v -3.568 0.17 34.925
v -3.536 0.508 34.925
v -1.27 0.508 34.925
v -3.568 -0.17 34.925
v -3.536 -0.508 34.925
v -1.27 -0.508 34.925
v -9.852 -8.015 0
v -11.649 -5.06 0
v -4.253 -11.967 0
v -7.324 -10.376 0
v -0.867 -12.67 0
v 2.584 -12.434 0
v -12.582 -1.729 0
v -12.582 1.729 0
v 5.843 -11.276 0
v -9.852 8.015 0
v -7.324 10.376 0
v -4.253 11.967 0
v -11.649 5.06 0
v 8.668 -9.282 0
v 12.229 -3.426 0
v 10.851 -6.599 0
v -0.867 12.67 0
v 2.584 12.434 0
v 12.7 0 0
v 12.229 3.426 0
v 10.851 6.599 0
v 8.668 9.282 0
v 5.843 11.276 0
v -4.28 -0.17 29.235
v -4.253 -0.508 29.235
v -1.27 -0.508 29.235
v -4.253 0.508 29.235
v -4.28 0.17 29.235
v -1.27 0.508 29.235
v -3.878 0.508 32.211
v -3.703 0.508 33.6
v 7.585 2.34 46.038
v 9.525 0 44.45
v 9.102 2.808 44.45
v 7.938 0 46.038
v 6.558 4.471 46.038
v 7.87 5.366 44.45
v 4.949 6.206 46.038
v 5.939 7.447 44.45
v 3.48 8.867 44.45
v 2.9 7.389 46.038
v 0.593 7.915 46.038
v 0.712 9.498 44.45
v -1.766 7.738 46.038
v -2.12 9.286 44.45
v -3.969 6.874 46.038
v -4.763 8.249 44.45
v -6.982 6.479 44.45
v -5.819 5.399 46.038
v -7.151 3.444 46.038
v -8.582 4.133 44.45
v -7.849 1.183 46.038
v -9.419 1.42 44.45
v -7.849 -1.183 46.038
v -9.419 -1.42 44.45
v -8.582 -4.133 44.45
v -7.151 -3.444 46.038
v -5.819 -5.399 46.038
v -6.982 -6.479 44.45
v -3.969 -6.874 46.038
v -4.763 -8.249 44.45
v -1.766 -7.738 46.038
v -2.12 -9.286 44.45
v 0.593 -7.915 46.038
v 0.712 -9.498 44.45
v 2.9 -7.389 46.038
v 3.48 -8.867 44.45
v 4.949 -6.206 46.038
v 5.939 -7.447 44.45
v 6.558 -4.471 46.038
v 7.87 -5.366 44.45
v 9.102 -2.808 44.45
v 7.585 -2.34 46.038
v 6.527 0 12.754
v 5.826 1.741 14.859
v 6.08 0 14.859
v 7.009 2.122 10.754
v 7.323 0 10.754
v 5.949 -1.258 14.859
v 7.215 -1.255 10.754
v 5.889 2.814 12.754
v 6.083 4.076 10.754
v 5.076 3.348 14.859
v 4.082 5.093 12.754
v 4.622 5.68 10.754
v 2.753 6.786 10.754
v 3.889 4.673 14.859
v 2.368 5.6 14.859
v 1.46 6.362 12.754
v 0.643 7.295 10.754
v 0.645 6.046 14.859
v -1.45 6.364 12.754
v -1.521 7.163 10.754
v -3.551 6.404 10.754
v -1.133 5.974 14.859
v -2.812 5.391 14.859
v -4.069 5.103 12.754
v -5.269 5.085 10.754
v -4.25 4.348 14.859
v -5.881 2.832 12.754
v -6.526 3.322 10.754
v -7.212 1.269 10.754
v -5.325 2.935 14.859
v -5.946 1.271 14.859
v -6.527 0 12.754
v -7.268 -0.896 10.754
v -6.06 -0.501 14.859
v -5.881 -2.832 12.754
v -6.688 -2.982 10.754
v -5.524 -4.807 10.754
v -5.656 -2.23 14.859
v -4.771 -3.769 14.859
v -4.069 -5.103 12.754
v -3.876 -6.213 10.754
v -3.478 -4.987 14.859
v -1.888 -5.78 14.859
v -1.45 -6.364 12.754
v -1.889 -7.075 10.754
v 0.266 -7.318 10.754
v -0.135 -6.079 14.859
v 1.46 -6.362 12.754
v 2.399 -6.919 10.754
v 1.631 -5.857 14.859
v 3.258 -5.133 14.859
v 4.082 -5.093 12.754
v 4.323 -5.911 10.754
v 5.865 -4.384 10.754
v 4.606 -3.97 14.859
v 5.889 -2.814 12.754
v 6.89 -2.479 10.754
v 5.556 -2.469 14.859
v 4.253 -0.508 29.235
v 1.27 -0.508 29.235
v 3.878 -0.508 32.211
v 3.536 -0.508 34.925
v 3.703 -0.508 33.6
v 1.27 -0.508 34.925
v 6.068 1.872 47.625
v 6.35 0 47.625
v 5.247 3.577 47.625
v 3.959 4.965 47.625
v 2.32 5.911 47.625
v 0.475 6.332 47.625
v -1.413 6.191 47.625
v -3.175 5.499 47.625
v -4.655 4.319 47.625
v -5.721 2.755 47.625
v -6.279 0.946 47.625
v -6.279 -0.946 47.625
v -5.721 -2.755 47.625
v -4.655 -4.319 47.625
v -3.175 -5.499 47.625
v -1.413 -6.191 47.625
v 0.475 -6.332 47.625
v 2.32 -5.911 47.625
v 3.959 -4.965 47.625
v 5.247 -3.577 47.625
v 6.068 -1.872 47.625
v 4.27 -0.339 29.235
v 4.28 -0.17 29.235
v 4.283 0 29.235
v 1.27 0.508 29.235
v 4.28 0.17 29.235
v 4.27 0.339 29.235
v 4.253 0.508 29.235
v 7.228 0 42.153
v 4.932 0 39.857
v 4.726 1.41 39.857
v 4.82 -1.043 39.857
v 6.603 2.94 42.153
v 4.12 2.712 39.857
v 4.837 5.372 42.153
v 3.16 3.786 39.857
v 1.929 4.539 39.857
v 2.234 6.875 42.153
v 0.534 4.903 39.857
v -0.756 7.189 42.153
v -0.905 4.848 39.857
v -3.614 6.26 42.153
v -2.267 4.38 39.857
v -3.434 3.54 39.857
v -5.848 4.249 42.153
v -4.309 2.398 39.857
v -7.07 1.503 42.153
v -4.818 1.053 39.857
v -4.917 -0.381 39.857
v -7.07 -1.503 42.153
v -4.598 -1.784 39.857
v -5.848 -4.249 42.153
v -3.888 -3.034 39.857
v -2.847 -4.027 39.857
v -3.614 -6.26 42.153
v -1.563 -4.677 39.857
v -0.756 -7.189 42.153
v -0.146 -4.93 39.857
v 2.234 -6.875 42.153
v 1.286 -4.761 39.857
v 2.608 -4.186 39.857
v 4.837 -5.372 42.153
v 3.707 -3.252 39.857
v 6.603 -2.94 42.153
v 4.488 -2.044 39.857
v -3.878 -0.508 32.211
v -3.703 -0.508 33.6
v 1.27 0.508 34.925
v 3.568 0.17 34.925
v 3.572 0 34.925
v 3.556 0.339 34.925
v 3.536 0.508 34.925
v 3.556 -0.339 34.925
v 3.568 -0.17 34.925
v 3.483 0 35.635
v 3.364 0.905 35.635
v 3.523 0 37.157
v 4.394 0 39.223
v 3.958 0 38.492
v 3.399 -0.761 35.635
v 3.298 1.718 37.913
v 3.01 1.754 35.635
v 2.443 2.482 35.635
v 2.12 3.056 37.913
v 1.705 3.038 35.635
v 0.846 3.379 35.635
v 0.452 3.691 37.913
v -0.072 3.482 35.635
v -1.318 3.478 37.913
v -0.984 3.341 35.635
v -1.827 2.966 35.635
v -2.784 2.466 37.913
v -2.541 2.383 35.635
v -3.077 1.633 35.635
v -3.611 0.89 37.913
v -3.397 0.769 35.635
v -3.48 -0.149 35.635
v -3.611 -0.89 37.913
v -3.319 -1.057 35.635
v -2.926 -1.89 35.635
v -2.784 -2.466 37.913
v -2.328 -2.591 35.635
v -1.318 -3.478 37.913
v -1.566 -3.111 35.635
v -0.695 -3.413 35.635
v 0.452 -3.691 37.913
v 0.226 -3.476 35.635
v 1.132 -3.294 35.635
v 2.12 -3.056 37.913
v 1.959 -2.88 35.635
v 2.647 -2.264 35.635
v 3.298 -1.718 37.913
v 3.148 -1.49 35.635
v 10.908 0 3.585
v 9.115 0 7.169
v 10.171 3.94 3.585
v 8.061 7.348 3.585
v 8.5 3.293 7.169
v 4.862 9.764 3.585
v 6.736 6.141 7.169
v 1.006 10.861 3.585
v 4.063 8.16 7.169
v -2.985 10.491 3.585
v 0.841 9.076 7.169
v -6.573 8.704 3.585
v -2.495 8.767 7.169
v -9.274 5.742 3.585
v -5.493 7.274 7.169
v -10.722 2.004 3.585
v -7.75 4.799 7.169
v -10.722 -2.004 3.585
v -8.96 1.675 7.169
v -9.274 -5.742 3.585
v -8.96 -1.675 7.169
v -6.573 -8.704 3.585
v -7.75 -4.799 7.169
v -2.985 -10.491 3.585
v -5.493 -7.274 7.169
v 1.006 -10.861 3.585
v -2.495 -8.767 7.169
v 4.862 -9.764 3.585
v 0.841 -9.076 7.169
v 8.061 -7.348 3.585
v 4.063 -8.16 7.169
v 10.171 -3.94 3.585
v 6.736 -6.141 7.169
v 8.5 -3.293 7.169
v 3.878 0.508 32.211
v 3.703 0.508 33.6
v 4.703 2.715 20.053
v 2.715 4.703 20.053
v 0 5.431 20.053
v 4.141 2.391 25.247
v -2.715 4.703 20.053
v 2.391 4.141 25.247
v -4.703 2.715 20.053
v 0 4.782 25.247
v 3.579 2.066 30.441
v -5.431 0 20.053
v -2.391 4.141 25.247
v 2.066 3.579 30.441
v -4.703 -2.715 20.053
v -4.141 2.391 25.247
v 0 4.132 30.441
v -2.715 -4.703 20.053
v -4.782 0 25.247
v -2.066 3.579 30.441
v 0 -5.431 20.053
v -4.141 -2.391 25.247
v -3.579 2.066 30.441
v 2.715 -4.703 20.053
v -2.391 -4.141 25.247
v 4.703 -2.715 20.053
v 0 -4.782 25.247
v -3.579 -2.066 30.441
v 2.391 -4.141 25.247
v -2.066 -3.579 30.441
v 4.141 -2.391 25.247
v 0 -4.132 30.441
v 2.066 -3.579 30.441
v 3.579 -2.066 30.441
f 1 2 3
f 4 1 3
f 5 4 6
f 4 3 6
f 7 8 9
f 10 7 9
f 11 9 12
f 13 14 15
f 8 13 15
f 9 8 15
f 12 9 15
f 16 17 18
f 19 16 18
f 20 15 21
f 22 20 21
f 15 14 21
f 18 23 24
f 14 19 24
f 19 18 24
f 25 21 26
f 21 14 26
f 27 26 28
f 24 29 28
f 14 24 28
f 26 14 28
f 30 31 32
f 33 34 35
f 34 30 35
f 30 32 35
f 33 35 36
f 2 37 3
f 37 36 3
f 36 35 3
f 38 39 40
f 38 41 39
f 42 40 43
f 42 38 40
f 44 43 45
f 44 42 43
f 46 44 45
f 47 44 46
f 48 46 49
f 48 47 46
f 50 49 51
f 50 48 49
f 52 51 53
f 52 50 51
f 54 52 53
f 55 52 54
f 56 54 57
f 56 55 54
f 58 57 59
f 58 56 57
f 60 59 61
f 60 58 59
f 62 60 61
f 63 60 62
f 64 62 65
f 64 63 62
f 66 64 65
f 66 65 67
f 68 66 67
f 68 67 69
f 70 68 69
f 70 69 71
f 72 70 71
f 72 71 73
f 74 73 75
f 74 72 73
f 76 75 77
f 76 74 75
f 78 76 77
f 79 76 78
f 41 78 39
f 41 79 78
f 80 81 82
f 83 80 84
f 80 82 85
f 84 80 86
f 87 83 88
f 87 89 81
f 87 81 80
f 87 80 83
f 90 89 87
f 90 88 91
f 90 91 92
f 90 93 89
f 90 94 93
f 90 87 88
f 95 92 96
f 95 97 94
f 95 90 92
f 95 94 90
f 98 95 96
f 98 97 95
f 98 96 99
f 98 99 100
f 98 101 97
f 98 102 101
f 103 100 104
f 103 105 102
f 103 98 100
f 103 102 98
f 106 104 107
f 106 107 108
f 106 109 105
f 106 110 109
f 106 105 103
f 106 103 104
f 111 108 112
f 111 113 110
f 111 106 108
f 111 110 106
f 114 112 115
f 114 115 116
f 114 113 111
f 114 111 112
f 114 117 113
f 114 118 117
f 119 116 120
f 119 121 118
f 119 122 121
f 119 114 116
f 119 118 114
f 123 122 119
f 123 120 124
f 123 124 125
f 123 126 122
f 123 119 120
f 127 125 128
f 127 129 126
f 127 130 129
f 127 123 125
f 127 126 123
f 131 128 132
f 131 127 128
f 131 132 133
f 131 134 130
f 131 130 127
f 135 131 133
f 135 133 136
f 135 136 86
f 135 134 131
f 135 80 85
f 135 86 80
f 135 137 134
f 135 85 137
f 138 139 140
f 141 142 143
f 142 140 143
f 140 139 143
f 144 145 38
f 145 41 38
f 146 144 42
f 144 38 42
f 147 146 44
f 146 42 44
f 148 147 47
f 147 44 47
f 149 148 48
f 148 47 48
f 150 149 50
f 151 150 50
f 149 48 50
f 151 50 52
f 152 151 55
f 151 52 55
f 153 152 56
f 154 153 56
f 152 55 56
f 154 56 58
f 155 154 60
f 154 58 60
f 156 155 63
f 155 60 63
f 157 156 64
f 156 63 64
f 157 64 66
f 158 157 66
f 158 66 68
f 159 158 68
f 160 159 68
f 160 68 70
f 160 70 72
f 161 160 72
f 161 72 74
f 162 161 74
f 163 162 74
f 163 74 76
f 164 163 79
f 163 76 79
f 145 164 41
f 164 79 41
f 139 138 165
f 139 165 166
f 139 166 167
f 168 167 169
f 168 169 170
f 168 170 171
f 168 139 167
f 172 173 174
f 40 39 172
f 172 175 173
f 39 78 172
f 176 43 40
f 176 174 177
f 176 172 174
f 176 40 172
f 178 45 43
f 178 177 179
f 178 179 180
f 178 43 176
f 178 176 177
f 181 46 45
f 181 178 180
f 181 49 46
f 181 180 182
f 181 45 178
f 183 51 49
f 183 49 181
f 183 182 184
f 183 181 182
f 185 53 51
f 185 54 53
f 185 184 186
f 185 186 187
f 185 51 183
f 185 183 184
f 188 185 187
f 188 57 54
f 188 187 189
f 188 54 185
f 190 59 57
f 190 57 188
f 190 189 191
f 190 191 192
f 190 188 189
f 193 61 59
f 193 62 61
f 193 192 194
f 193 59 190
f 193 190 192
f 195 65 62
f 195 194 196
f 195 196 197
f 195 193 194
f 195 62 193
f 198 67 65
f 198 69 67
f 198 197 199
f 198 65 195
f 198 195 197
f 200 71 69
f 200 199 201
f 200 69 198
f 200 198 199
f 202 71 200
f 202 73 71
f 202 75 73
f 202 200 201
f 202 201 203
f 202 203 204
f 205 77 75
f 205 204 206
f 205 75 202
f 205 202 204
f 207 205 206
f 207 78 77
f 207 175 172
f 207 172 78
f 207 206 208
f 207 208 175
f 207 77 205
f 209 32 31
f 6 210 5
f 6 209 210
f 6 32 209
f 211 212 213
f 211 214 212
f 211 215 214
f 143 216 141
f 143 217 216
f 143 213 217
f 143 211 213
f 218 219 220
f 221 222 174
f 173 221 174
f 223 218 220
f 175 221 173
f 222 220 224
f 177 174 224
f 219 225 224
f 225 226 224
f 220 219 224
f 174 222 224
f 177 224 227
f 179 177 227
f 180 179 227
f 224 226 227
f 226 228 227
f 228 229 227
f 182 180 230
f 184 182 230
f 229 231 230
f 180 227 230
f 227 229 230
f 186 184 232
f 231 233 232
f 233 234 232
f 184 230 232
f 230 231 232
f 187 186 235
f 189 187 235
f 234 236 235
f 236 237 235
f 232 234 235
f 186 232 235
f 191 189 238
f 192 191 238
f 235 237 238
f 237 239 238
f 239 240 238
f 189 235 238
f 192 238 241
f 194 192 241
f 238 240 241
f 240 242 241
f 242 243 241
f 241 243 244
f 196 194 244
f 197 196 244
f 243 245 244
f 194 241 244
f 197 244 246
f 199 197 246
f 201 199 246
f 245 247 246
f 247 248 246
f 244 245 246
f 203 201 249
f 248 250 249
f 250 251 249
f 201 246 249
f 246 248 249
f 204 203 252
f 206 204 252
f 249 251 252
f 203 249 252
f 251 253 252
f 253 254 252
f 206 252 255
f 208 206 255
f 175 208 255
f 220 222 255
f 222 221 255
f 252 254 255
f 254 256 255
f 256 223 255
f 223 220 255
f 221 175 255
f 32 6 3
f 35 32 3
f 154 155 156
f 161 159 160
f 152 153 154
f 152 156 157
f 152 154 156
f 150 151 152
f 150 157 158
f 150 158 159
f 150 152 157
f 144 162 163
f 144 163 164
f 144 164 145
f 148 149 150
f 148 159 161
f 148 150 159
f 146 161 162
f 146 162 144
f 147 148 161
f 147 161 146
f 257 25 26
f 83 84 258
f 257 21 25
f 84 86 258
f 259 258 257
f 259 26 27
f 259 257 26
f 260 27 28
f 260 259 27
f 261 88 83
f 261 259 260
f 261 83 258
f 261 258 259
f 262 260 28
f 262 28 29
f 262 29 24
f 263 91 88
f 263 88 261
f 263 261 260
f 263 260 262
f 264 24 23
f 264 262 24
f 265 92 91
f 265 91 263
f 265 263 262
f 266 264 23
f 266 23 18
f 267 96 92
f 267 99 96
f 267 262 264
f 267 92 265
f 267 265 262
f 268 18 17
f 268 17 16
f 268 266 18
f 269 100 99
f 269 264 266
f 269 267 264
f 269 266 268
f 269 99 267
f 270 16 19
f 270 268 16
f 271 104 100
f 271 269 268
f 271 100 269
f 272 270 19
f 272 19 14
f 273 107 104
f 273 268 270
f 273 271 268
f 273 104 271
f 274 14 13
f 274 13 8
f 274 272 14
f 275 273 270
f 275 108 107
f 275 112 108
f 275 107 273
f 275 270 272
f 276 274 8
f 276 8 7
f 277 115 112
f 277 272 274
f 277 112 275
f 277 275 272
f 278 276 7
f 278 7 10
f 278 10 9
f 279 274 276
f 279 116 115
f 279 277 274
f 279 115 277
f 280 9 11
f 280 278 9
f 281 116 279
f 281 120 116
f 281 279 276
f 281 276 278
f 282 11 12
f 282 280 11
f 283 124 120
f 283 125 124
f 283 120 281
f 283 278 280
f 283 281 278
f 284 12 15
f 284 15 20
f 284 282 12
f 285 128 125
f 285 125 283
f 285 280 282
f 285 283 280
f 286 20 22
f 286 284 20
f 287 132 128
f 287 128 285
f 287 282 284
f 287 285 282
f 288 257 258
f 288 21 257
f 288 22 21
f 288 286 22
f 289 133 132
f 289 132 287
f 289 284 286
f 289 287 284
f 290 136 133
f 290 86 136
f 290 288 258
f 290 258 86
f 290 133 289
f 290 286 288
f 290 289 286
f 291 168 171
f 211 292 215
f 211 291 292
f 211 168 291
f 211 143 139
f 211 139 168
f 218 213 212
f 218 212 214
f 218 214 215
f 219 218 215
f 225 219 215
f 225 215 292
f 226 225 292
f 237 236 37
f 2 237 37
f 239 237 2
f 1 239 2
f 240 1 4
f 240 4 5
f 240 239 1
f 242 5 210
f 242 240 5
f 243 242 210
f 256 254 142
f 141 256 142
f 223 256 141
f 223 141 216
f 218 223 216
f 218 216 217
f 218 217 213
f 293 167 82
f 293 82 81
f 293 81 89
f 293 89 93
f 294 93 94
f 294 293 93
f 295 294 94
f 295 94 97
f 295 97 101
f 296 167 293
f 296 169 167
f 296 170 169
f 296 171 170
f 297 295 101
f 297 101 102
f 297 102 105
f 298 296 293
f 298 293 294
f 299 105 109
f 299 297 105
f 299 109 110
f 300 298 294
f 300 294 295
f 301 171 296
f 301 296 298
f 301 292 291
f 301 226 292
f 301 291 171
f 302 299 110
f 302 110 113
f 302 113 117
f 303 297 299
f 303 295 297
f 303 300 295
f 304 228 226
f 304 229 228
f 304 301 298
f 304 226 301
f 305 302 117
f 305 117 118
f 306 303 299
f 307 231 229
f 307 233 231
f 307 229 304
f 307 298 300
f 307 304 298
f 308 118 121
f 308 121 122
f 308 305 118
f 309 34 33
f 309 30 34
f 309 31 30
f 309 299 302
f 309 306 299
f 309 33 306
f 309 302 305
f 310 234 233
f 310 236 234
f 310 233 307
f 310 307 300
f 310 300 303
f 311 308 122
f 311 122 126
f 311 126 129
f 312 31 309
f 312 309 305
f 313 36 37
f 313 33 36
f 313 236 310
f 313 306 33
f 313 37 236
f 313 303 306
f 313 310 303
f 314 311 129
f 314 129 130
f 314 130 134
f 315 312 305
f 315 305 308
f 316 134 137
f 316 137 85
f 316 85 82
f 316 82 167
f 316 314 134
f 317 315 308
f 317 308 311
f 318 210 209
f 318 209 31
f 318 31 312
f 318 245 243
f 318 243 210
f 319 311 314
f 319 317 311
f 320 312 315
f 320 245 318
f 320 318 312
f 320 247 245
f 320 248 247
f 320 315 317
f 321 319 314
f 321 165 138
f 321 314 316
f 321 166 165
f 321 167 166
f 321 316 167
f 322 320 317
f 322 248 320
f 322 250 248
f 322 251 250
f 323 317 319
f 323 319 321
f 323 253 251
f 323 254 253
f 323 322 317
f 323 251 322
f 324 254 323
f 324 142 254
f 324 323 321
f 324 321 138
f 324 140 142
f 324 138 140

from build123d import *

# Parameters (mm, degrees)
F0_R           = 12.7
F2_R           = 6.35
F3_FACE_R      = 6.35
F5_R           = 3.175
F6_FACE_R      = 3.175
F8_R           = 9.525
F10_R          = 12.7
F11_R          = 5.08
F9_FACE_R      = 9.525
F13_R          = 7.9375
F16_R          = 6.35
F14_FACE_R     = 7.9375
F18_W          = 0.508
F18_H          = 5.6896
F19_DEPTH      = 12.7010001
F19_DEPTH_BACK = 25.4
F20_DEPTH      = 1.27


with BuildPart() as f3:
    # F0 (on Top) → F3 section 0
    with BuildSketch(Plane.XY):
        Circle(F0_R)
    # F2 (on offset) → F3 section 1
    with BuildSketch(Plane.XY.offset(12.7)):
        Circle(F2_R)
    loft()

    # F3_face (on face) → F6 section 0
    with BuildSketch(Plane.XY.offset(12.7)):
        Circle(F3_FACE_R)
    # F5 (on offset) → F6 section 1
    with BuildSketch(Plane.XY.offset(38.1)):
        Circle(F5_R)
    loft()

    # F6_face (on face) → F9 section 0
    with BuildSketch(Plane.XY.offset(38.1)):
        Circle(F6_FACE_R)
    # F8 (on offset) → F9 section 1
    with BuildSketch(Plane.XY.offset(44.45)):
        Circle(F8_R)
    loft()

    # F10
    f10_edges = [f3.edges().sort_by_distance(p)[0] for p in [
        (-6.35, 0, 12.7),
    ]]
    fillet(f10_edges, radius=F10_R)

    # F11
    f11_edges = [f3.edges().sort_by_distance(p)[0] for p in [
        (-3.175, 0, 38.1),
    ]]
    fillet(f11_edges, radius=F11_R)

    # F9_face (on face) → F14 section 0
    with BuildSketch(Plane.XY.offset(44.45)):
        Circle(F9_FACE_R)
    # F13 (on offset) → F14 section 1
    with BuildSketch(Plane.XY.offset(46.0375)):
        Circle(F13_R)
    loft()

    # F16 (on offset) → F17 section 0
    with BuildSketch(Plane.XY.offset(47.625)):
        Circle(F16_R)
    # F14_face (on face) → F17 section 1
    with BuildSketch(Plane.XY.offset(46.0375)):
        Circle(F14_FACE_R)
    loft()

    # F18 (on Right) → F19 (cut, two sides)
    with BuildSketch(Plane.YZ) as f19_sk:
        with Locations((0.254, 32.0802)):
            Rectangle(F18_W, F18_H)
        with Locations((-0.254, 32.0802)):
            Rectangle(F18_W, F18_H)
    extrude(amount=-F19_DEPTH, mode=Mode.SUBTRACT)
    extrude(f19_sk.sketch, amount=F19_DEPTH_BACK, mode=Mode.SUBTRACT)

    # F18 (on Right) → F20 (join, symmetric)
    with BuildSketch(Plane.YZ):
        with Locations((0.254, 32.0802)):
            Rectangle(F18_W, F18_H)
        with Locations((-0.254, 32.0802)):
            Rectangle(F18_W, F18_H)
    extrude(amount=F20_DEPTH, both=True)


solid = f3.part
